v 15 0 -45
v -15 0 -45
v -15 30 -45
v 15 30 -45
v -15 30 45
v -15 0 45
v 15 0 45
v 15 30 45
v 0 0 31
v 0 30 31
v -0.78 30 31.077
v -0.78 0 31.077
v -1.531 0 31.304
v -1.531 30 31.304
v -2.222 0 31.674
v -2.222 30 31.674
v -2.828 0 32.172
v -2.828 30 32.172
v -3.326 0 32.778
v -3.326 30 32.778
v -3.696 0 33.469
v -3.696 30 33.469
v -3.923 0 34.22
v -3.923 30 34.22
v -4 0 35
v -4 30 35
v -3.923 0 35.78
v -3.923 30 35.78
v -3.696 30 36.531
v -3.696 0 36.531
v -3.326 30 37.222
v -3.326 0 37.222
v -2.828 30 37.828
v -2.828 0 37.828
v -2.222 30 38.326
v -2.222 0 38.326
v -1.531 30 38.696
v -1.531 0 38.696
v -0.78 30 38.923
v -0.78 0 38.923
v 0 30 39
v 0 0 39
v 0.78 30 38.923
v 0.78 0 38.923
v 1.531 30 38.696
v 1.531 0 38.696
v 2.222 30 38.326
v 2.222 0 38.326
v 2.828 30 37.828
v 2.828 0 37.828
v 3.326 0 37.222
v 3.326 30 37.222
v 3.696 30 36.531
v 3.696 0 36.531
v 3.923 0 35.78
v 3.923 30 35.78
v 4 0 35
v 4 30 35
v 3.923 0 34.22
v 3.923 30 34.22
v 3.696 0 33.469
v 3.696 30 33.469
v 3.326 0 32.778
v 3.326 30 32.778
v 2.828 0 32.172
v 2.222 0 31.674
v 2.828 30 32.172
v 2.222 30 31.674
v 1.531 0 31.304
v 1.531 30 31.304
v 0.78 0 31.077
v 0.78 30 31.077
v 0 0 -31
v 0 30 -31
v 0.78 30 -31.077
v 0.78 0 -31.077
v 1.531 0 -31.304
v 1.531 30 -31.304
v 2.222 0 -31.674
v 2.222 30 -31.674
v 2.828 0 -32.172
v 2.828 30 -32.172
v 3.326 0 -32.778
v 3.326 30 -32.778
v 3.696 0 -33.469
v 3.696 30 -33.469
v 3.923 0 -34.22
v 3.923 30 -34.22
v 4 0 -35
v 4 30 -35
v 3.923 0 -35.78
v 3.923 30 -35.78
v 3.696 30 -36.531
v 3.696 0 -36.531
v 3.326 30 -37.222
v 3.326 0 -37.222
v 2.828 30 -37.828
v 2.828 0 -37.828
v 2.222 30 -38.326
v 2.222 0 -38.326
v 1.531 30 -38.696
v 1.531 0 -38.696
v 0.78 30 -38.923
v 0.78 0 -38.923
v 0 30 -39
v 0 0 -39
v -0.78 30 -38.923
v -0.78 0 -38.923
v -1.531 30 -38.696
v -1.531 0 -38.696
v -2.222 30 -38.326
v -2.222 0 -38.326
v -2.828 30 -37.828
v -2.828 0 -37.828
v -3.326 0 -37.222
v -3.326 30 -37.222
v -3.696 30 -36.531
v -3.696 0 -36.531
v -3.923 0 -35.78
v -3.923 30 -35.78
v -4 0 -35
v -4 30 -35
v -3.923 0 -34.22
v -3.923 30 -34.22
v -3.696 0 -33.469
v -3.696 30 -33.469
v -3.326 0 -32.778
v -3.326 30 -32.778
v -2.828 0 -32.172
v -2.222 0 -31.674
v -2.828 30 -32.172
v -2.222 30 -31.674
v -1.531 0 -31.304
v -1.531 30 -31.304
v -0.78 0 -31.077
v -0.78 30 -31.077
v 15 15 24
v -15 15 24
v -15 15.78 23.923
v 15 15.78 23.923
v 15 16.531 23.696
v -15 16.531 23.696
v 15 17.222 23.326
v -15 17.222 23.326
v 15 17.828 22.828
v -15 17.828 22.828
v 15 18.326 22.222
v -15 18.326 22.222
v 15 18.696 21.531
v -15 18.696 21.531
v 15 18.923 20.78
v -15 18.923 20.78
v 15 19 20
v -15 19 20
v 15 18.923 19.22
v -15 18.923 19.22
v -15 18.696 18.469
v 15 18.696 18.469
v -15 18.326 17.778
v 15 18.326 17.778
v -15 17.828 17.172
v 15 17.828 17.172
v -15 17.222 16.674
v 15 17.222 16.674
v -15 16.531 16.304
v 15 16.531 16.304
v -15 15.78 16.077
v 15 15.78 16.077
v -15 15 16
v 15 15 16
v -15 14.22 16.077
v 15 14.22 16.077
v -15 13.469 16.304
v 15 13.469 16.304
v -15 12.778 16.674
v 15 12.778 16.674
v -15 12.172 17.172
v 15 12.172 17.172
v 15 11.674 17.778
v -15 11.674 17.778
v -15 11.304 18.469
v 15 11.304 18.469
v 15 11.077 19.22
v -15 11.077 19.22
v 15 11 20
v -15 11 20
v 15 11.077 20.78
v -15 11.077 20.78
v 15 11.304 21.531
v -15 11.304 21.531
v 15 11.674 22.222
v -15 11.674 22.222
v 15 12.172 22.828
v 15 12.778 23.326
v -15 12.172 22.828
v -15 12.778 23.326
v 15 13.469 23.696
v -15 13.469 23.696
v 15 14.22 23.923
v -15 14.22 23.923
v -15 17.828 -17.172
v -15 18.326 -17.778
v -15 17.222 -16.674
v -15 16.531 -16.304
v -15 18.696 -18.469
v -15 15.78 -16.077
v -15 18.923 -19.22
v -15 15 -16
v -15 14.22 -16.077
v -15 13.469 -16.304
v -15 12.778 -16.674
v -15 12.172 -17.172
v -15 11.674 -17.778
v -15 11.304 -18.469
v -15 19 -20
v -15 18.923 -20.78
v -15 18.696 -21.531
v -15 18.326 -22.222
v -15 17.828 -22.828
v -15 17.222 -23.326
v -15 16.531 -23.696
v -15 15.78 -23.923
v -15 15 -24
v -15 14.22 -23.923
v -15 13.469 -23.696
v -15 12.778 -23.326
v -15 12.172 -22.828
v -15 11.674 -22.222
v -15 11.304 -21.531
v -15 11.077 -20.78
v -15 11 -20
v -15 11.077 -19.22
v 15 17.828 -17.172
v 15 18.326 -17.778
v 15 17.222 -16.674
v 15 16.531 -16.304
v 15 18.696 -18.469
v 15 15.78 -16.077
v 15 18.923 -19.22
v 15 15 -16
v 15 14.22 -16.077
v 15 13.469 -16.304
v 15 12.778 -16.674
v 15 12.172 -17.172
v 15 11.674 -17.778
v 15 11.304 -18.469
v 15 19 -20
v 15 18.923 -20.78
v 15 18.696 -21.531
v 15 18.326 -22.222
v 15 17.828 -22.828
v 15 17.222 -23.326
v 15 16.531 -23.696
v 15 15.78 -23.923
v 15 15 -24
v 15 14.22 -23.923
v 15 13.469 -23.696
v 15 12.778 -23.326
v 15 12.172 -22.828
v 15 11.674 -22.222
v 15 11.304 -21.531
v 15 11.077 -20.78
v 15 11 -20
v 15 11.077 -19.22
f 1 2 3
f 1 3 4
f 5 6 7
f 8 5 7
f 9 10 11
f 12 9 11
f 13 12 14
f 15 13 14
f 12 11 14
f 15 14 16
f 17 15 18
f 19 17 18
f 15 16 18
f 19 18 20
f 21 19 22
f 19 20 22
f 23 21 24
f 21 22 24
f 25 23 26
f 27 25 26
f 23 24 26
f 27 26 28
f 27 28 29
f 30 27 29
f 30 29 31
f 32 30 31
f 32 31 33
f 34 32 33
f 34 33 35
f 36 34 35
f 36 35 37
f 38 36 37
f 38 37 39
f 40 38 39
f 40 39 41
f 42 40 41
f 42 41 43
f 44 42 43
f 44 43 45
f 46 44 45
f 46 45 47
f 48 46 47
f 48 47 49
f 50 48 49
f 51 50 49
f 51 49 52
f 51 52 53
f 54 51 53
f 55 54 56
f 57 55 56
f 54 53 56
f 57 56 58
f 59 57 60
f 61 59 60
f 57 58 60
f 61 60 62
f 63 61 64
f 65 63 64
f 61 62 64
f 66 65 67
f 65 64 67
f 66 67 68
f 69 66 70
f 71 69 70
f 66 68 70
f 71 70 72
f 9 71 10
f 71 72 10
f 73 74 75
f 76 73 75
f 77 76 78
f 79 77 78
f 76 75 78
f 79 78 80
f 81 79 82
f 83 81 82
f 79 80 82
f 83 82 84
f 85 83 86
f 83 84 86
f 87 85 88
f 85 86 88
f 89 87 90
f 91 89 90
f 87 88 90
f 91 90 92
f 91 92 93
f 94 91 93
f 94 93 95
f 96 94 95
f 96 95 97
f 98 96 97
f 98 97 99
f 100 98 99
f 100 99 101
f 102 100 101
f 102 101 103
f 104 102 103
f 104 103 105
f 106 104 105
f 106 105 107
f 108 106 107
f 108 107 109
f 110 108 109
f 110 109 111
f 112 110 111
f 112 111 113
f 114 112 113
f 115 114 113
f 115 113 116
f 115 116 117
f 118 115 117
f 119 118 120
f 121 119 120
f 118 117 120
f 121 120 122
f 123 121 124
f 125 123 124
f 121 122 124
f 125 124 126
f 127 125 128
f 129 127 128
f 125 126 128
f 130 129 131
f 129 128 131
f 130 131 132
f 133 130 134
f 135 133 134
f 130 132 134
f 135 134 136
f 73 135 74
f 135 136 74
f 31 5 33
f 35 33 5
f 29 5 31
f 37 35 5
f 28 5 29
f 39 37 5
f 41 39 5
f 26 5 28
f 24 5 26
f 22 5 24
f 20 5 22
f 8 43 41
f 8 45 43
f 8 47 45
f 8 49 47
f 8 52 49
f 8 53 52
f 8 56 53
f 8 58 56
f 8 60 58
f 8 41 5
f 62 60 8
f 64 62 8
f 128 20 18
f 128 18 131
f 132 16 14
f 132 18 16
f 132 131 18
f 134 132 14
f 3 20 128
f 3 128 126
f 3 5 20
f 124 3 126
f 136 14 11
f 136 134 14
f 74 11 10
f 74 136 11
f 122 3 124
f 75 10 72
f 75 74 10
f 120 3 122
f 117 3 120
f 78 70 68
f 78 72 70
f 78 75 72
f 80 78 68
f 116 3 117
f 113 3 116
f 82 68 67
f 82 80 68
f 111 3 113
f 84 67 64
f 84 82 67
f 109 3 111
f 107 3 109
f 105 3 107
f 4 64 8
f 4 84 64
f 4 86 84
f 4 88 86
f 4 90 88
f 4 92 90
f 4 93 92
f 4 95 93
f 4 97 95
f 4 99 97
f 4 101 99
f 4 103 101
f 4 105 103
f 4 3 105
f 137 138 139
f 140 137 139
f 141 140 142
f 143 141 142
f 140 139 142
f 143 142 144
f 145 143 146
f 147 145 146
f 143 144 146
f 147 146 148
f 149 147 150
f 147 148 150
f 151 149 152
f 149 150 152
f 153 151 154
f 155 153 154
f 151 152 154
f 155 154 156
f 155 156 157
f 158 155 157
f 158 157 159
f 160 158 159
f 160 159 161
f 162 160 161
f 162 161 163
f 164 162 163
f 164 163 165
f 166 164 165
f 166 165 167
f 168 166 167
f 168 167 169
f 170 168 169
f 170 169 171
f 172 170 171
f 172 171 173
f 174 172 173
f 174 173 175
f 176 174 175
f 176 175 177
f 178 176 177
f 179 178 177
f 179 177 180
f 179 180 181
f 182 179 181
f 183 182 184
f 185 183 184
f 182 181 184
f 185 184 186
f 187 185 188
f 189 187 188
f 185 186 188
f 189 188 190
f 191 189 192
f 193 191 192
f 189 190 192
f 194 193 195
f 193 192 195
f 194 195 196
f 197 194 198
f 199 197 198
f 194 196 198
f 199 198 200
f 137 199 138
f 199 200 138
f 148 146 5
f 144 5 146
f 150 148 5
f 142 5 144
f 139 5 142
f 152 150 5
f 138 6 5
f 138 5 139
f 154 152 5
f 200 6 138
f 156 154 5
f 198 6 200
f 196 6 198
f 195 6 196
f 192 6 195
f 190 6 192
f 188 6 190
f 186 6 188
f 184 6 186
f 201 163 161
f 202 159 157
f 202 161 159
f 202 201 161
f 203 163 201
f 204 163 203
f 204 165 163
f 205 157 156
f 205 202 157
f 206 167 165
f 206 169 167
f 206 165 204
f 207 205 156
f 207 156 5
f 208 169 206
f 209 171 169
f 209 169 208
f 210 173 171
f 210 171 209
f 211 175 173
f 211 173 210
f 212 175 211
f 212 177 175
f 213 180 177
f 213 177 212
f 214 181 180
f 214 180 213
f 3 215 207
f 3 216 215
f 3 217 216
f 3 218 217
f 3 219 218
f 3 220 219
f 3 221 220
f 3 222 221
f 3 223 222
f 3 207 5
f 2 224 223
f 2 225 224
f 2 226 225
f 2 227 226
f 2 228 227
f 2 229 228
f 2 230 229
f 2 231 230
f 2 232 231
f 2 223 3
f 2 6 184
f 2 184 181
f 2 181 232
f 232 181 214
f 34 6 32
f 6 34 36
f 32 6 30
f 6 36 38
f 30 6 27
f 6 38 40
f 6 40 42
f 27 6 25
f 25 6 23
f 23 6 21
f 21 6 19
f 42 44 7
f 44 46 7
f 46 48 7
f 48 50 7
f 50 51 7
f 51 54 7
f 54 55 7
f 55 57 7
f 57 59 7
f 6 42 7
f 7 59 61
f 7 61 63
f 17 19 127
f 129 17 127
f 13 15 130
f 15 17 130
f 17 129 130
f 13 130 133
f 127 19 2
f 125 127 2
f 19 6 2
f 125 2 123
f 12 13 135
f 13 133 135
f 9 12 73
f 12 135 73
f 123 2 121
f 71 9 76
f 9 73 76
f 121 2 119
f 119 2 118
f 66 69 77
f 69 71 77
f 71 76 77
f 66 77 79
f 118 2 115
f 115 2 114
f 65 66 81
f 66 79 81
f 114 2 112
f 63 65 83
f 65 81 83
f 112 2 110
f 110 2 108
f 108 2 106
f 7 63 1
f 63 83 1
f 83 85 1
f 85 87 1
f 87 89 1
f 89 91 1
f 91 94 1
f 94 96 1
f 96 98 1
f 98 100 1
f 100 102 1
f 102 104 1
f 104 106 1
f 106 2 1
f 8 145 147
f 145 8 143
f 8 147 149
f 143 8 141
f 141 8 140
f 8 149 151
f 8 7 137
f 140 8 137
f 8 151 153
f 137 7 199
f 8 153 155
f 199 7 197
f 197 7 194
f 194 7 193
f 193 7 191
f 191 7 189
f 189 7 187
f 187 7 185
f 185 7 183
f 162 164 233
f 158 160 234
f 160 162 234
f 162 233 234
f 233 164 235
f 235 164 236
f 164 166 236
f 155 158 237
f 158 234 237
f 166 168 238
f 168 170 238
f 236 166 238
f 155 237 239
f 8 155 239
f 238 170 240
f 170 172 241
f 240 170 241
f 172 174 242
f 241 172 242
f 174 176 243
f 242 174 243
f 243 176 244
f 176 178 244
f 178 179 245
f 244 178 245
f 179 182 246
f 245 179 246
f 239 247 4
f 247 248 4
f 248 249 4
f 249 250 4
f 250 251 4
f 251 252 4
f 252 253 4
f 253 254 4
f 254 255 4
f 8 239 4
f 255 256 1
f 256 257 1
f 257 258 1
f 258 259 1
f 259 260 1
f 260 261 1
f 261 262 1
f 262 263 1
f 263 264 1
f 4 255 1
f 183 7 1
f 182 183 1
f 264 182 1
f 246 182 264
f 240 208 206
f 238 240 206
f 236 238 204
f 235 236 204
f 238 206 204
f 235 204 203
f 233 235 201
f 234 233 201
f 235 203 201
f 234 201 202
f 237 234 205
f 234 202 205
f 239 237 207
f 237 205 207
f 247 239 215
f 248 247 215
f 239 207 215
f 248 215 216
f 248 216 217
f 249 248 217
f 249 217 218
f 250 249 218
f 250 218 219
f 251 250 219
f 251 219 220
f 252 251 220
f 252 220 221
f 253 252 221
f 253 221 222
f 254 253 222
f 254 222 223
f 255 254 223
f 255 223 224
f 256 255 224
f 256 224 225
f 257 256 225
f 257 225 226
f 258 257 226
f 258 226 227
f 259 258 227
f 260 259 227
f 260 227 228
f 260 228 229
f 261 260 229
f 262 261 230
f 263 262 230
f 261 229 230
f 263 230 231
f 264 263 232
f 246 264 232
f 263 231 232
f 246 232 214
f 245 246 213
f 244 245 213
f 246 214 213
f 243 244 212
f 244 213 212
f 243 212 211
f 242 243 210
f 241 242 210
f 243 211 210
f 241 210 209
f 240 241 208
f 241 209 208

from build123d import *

# Parameters (mm, degrees)
SKETCH1_W           = 30
SKETCH1_H           = 90
BOSS_EXTRUDE1_DEPTH = 30
SKETCH2_R           = 4
CUT_EXTRUDE1_DEPTH  = 62.846584384
SKETCH3_R           = 4
CUT_EXTRUDE2_DEPTH  = 57.124860802


with BuildPart() as part:
    # Sketch1 → Boss-Extrude1 (new body)
    with BuildSketch(Plane(origin=(0, 0, 0), x_dir=(1, 0, 0), z_dir=(0, 1, 0))):
        Rectangle(SKETCH1_W, SKETCH1_H)
    extrude(amount=BOSS_EXTRUDE1_DEPTH)

    # Sketch2 → Cut-Extrude1 (cut, through all)
    with BuildSketch(Plane.ZY.offset(15)):
        with Locations((-20, 15)):
            Circle(SKETCH2_R)
        with Locations((20, 15)):
            Circle(SKETCH2_R)
    extrude(amount=-CUT_EXTRUDE1_DEPTH, mode=Mode.SUBTRACT)

    # Sketch3 → Cut-Extrude2 (cut, through all)
    with BuildSketch(Plane(origin=(0, 30, 0), x_dir=(1, 0, 0), z_dir=(0, 1, 0))):
        with Locations(Location((0, 35, 0), (0, 0, 270))):
            Circle(SKETCH3_R)
        with Locations(Location((0, -35, 0), (0, 0, 90))):
            Circle(SKETCH3_R)
    extrude(amount=-CUT_EXTRUDE2_DEPTH, mode=Mode.SUBTRACT)


solid = part.part
